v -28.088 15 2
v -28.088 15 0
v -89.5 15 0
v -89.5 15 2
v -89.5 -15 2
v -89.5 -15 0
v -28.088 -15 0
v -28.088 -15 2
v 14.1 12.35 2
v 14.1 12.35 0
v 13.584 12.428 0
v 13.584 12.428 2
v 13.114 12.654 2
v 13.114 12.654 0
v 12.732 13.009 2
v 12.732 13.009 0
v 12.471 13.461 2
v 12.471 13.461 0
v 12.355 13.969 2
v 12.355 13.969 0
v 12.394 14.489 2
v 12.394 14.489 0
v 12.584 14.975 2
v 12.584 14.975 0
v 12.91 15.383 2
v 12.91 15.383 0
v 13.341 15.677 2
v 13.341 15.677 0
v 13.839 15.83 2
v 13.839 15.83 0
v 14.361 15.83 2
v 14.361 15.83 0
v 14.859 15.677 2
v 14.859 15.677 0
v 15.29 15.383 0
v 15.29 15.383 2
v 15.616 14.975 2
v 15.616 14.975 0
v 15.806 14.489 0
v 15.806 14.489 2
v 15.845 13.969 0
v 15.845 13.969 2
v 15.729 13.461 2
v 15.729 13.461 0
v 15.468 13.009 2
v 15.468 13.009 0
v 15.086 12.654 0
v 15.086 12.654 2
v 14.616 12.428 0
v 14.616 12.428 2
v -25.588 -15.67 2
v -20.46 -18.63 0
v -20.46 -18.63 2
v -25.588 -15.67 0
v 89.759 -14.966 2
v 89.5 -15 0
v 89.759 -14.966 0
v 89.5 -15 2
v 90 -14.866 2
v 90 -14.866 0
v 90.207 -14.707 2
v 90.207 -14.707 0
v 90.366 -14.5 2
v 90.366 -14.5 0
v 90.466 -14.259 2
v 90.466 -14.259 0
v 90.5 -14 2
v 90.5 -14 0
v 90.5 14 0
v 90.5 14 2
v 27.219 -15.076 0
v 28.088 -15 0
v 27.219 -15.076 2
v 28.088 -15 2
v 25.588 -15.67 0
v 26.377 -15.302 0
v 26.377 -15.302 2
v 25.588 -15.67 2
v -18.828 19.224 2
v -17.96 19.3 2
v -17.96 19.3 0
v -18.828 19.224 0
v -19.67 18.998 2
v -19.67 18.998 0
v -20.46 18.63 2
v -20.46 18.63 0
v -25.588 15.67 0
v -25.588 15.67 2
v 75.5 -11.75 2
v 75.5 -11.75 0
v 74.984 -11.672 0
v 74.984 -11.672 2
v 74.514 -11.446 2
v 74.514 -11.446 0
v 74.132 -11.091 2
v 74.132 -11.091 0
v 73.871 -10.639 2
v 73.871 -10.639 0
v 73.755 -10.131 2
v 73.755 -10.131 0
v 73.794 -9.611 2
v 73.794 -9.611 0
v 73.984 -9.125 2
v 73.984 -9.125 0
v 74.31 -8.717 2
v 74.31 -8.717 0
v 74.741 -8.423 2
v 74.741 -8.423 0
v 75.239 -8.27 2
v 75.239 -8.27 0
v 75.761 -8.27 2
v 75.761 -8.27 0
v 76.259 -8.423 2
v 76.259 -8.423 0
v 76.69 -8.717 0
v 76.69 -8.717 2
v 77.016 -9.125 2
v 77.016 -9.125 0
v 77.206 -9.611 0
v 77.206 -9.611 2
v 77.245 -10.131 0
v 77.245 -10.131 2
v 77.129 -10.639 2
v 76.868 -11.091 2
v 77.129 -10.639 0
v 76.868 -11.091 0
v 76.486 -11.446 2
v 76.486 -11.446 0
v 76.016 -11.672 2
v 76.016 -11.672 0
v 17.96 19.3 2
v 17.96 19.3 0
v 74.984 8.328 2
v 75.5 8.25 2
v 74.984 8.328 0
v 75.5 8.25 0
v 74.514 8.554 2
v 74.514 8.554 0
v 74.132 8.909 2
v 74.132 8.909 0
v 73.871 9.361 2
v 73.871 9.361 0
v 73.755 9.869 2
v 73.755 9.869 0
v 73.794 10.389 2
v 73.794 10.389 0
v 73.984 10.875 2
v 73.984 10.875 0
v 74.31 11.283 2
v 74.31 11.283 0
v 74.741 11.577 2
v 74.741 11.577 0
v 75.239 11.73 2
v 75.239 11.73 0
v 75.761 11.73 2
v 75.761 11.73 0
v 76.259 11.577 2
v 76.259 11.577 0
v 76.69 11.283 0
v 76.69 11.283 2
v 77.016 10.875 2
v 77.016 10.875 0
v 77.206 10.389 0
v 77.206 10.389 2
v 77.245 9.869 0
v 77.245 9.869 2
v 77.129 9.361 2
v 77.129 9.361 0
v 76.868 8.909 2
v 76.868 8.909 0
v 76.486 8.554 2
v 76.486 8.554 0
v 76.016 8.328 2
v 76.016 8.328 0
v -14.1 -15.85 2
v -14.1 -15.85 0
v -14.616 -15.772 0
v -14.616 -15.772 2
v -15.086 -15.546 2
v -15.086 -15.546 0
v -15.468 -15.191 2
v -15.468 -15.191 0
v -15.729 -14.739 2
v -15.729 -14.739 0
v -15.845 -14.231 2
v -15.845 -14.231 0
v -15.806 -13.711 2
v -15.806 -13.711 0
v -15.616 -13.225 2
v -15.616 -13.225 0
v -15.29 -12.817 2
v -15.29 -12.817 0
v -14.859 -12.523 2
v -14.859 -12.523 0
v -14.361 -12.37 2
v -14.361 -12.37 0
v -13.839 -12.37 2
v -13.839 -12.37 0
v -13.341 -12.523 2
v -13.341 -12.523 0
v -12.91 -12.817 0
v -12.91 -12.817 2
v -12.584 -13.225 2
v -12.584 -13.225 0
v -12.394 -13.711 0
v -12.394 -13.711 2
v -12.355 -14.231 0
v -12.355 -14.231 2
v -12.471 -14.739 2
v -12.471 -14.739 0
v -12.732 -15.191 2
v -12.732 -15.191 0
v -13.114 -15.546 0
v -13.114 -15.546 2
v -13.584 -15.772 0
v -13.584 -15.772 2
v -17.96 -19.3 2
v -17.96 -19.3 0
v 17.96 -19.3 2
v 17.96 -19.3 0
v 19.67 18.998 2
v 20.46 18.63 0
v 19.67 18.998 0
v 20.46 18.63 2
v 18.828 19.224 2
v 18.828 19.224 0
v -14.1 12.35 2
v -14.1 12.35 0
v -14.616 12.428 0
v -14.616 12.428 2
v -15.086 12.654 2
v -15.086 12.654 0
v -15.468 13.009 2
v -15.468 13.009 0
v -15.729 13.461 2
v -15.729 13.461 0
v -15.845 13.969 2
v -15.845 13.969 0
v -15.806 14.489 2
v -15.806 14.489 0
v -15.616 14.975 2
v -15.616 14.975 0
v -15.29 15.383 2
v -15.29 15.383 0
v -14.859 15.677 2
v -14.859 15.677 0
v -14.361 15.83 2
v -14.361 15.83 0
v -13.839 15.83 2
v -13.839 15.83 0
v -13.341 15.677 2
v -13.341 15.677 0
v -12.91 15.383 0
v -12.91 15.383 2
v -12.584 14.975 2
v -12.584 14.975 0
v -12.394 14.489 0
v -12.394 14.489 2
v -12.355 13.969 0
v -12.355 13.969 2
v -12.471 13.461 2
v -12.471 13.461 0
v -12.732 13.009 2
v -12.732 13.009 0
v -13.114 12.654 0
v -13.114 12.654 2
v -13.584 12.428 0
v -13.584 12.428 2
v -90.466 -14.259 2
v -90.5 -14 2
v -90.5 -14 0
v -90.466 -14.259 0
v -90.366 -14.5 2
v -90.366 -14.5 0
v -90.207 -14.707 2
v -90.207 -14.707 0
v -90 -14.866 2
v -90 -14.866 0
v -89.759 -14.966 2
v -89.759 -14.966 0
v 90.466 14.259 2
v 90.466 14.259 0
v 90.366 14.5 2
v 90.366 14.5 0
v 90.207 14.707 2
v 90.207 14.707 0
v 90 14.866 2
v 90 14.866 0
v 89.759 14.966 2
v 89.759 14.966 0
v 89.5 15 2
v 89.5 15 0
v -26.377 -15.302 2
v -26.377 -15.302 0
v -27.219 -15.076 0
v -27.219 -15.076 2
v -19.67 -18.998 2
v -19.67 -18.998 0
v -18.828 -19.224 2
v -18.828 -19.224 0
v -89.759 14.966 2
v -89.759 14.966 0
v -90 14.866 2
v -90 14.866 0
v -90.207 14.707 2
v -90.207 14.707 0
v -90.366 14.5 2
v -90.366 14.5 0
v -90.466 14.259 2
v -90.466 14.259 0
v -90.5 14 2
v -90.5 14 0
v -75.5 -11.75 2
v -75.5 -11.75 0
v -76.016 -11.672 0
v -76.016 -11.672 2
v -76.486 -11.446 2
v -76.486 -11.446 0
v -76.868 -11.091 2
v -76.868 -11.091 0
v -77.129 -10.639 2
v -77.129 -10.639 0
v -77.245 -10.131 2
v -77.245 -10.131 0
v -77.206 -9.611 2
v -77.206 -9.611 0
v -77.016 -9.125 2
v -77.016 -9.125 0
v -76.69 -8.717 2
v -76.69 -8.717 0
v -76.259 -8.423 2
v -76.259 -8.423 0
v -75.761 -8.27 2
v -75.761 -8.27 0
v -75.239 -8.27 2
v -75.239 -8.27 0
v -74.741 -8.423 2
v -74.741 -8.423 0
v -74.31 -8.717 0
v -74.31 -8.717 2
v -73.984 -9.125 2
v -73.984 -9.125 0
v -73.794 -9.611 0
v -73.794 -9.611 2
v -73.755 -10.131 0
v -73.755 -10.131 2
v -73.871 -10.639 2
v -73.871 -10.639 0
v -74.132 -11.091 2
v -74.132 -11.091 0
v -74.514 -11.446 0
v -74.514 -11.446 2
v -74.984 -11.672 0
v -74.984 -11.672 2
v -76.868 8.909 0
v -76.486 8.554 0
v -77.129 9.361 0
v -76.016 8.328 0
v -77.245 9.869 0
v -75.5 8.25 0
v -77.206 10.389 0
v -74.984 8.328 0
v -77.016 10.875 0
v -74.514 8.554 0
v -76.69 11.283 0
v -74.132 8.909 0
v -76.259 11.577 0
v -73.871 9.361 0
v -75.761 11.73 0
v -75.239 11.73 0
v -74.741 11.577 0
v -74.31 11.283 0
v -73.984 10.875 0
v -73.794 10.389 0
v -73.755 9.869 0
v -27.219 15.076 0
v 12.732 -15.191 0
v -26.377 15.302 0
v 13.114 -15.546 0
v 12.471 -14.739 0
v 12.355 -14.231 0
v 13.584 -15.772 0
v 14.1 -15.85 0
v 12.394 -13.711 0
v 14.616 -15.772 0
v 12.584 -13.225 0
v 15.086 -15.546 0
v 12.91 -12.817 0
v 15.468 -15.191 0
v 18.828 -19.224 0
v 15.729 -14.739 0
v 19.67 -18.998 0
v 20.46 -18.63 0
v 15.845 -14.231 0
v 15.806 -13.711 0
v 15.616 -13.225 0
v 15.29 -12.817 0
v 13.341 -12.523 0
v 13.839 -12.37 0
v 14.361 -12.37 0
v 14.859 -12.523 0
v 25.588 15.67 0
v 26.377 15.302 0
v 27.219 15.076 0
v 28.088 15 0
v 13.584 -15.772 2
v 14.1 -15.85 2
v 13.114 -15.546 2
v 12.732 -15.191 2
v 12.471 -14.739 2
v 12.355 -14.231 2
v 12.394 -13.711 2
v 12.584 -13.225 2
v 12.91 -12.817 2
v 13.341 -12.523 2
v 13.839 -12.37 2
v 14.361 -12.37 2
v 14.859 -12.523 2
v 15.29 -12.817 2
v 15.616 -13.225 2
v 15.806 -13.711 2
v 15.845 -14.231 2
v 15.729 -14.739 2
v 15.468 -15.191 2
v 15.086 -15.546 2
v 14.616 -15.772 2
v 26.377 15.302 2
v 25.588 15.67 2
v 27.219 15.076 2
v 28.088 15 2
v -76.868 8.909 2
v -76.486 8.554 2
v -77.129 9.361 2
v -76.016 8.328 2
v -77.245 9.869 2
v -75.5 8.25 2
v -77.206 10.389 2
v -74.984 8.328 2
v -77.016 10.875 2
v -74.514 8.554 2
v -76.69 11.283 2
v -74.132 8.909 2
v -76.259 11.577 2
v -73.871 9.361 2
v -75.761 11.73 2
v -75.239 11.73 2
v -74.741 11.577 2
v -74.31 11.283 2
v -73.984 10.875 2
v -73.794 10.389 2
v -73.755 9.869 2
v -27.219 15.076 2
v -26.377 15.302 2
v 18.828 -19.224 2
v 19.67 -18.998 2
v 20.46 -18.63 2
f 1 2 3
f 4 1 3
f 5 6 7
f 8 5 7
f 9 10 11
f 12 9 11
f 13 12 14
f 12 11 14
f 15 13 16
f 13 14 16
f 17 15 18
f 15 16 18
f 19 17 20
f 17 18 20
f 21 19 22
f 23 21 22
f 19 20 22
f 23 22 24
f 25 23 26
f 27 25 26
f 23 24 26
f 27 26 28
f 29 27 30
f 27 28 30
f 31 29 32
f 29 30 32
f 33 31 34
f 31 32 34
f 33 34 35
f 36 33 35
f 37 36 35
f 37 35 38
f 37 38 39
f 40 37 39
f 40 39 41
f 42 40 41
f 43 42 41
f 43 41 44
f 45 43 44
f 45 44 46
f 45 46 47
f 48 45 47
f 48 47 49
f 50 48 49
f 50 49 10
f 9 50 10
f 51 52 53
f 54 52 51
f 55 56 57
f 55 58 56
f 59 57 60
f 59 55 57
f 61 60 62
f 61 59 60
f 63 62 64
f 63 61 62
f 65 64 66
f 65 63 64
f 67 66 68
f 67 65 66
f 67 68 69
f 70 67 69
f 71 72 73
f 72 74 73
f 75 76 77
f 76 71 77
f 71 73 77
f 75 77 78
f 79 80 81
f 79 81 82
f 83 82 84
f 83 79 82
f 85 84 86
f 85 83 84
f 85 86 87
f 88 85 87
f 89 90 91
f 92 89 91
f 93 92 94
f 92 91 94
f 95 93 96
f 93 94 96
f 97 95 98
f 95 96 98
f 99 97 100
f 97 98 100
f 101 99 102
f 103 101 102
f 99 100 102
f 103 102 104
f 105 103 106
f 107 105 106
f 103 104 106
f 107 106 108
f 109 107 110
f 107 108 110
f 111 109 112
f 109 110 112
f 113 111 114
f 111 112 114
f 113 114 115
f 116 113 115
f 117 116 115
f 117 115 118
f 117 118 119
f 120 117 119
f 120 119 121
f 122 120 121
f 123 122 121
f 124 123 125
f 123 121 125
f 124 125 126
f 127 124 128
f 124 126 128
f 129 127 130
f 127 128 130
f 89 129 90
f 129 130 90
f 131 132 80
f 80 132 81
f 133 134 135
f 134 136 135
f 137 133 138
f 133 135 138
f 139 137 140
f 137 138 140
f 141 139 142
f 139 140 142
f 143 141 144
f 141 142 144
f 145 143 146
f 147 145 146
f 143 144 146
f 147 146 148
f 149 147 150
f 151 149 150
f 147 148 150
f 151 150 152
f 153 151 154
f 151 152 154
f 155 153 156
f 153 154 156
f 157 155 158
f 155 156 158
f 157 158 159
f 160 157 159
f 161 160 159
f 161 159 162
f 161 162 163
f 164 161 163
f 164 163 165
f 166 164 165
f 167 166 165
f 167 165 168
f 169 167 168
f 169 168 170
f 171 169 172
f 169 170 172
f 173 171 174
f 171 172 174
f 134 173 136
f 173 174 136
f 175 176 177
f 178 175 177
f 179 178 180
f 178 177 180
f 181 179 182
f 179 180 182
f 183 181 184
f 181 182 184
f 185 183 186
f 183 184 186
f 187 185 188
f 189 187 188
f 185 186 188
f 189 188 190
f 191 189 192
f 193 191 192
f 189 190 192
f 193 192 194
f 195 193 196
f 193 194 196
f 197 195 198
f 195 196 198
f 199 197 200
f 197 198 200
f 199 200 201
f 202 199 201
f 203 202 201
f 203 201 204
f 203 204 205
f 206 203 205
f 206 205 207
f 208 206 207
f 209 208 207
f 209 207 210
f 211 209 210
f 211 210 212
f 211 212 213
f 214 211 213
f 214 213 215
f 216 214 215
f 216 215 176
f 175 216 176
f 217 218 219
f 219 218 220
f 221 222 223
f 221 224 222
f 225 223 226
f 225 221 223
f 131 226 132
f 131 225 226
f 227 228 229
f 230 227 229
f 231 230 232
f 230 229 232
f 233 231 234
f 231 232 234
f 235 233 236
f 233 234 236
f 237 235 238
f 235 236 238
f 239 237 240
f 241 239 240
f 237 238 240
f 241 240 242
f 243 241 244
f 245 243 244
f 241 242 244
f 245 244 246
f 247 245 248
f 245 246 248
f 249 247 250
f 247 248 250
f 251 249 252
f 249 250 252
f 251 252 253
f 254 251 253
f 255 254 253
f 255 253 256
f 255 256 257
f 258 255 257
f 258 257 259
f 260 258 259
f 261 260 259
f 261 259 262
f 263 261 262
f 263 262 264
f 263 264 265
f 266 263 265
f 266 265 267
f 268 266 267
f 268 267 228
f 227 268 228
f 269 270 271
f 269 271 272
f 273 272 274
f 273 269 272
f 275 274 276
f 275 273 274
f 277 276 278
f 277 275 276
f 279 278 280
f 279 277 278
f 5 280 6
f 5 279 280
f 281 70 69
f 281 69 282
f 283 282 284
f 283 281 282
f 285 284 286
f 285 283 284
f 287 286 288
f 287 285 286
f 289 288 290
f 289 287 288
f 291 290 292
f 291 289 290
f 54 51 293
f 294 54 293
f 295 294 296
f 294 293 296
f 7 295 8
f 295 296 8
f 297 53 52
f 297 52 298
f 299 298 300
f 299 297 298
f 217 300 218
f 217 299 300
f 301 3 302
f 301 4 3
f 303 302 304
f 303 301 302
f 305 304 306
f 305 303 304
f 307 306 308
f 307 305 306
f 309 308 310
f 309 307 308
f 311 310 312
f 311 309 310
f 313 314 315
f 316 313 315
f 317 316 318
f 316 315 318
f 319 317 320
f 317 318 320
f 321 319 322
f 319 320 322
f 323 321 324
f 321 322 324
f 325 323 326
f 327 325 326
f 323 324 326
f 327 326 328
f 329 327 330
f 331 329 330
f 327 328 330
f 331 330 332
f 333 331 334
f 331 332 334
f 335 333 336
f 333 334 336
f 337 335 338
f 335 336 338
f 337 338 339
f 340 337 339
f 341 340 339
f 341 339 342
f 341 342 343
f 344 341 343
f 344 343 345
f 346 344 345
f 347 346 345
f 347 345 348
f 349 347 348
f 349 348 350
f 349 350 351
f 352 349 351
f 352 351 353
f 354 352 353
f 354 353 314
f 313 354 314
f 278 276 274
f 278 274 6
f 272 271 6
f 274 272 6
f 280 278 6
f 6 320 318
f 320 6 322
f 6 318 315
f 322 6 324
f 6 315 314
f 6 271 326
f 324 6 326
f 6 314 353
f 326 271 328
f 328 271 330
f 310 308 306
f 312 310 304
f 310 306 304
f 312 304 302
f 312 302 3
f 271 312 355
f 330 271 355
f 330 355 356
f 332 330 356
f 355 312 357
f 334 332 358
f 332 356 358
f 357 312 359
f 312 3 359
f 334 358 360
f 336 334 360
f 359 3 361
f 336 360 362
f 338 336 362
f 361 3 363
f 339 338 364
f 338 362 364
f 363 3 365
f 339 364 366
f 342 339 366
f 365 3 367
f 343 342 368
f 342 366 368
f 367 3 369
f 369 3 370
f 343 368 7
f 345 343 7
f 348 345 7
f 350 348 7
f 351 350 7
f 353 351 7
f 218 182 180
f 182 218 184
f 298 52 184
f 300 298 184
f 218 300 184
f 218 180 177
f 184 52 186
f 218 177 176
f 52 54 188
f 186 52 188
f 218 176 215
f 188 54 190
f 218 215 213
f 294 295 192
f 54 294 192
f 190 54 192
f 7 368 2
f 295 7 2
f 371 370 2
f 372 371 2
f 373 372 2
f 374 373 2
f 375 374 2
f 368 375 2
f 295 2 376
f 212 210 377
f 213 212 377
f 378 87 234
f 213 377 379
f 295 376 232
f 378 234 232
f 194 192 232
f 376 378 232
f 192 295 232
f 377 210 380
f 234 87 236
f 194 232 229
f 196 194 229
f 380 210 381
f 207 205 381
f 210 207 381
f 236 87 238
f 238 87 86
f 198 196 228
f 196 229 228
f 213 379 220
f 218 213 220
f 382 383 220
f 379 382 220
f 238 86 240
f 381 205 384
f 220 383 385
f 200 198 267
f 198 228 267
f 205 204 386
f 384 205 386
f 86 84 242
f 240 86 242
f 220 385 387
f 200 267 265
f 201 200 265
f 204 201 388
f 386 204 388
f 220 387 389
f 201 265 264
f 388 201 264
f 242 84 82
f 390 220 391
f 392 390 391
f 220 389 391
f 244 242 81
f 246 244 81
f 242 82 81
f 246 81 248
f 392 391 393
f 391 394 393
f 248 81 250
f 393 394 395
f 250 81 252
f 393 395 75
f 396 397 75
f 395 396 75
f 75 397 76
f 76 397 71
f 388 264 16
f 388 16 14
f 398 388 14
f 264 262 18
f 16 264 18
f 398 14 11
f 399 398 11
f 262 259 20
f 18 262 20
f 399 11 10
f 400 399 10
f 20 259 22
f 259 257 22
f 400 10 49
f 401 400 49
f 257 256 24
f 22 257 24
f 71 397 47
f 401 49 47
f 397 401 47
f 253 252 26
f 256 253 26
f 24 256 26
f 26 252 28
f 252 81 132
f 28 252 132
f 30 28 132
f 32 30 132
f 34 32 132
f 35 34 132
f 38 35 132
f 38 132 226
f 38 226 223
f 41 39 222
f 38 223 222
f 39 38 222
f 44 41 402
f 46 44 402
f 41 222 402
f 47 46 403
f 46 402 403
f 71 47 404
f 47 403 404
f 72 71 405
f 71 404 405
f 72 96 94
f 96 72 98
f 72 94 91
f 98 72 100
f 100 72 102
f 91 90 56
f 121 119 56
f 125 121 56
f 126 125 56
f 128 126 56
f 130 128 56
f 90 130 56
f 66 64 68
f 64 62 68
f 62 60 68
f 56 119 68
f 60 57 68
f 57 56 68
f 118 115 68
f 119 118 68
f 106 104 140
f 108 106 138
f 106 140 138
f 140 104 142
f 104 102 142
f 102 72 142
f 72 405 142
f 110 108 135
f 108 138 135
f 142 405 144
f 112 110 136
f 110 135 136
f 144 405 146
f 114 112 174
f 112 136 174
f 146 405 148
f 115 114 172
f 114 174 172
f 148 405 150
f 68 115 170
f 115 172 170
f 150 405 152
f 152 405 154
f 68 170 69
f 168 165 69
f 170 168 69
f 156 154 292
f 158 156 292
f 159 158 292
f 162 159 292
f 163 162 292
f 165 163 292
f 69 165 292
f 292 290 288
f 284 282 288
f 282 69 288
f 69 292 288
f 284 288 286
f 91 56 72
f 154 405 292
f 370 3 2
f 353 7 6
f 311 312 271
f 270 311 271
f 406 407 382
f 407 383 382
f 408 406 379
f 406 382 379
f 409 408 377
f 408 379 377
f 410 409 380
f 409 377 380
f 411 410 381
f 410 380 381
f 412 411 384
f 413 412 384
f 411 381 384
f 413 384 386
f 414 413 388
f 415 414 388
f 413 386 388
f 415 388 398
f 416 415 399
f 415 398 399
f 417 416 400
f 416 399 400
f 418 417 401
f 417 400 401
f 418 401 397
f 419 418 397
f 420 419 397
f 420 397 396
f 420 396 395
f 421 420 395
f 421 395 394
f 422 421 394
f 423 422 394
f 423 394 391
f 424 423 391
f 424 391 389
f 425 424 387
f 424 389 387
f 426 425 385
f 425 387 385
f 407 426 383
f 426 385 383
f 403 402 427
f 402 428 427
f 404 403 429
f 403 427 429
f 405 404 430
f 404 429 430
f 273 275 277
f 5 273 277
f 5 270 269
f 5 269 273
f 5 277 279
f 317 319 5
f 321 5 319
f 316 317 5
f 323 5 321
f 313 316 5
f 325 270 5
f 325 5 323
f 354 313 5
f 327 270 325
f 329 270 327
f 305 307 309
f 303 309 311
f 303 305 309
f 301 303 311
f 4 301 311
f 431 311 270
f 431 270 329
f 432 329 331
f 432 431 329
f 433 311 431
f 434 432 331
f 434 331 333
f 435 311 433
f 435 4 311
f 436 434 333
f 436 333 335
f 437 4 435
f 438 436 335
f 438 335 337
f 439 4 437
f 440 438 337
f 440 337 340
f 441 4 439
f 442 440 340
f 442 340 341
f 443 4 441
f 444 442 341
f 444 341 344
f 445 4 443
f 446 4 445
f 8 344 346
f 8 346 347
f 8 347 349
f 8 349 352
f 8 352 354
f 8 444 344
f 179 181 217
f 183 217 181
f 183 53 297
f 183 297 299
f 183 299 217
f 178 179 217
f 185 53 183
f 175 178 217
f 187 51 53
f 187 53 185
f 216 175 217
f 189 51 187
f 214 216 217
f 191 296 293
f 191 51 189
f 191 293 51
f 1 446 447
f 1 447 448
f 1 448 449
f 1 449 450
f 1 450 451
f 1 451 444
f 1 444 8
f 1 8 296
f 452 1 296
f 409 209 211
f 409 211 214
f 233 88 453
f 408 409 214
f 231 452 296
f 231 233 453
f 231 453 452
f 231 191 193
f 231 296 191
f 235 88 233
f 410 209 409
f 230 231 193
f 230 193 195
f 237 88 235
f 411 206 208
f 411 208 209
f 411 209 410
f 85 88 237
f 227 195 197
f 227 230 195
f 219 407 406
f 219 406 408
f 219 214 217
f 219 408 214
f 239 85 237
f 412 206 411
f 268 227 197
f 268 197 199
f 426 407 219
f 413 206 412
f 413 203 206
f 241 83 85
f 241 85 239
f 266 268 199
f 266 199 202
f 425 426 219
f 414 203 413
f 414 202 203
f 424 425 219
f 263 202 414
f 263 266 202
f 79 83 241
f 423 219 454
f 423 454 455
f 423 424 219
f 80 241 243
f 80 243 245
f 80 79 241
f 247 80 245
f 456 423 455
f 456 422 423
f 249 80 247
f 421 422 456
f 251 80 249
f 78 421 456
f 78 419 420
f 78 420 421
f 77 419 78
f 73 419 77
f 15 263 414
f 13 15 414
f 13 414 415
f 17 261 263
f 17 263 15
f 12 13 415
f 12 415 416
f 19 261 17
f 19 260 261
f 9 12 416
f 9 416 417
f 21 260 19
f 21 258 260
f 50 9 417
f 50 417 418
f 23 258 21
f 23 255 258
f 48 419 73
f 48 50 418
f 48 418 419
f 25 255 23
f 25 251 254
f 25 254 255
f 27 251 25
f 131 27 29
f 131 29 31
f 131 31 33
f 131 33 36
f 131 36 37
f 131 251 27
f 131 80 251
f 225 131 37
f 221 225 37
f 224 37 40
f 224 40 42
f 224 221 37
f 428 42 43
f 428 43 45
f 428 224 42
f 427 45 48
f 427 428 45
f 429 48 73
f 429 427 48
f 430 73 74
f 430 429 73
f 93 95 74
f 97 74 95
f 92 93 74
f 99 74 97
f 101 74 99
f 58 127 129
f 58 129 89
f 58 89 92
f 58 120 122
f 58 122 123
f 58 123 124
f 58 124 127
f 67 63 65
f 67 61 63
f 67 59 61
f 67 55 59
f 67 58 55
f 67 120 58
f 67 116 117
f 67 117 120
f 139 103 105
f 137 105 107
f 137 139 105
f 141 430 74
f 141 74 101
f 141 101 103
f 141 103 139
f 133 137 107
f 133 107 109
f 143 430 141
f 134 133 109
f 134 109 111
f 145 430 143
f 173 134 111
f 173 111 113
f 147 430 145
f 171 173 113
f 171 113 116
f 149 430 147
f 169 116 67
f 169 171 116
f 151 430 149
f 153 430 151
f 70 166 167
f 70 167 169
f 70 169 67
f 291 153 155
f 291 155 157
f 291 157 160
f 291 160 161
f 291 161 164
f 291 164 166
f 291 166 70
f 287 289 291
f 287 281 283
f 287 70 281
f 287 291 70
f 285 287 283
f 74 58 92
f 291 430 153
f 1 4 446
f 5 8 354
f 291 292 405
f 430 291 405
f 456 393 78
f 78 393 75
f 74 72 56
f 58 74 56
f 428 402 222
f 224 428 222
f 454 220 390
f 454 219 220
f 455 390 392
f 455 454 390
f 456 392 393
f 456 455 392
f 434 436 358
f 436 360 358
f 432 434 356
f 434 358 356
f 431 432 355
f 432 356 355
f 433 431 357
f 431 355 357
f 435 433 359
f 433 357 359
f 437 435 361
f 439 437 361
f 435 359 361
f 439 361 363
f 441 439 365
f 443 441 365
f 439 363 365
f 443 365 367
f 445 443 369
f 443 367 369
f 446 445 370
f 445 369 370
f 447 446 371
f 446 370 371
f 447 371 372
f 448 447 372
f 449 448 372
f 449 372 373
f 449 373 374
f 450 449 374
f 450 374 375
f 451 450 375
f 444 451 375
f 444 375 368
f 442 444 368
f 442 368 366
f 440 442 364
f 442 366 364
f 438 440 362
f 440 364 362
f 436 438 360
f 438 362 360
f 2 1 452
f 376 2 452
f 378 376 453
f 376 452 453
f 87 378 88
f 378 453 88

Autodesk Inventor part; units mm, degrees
ref_plane "YZ Plane" through (0, 0, 0) normal (1, 0, 0) x (0, 1, 0)
ref_plane "XZ Plane" through (0, 0, 0) normal (0, 1, 0) x (-1, 0, 0)
ref_plane "XY Plane" through (0, 0, 0) normal (0, 0, 1) x (1, 0, 0)
sketch "スケッチ1" plane through (0, 0, 0) normal (0, 0, 1) x (1, 0, 0)
  line L0 (-90.5, -15) -> (90.5, -15)
  line L1 (90.5, -15) -> (90.5, 15)
  line L2 (90.5, 15) -> (-90.5, 15)
  line L3 (-90.5, 15) -> (-90.5, -15)
  line L4 (-90.5, -15) -> (90.5, 15) construction
  line L5 (90.5, -15) -> (-90.5, 15) construction
  line L6 (-19.3, -19.3) -> (19.3, -19.3)
  line L7 (19.3, -19.3) -> (19.3, 19.3)
  line L8 (19.3, 19.3) -> (-19.3, 19.3)
  line L9 (-19.3, 19.3) -> (-19.3, -19.3)
  line L10 (-19.3, -19.3) -> (19.3, 19.3) construction
  line L11 (19.3, -19.3) -> (-19.3, 19.3) construction
  line L12 (-19.3, 19.3) -> (-26.7478, 15)
  line L13 (-19.3, -19.3) -> (-26.7478, -15)
  line L14 (19.3, -19.3) -> (26.7478, -15)
  line L15 (26.7478, 15) -> (19.3, 19.3)
  point P0 (0, 0)
  dimension "d0" = 181
  dimension "d1" = 30
  dimension "d2" = 38.6
  dimension "d3" = 38.6
  dimension "d4" = 150
  dimension "d5" = 150
extrude "プレート1" add sketch "スケッチ1" along normal blind 2
sketch "スケッチ2" plane through (0, 0, 2) normal (0, 0, 1) x (1, 0, 0)
  line L0 (-75.5, -10) -> (75.5, -10) construction
  line L1 (75.5, -10) -> (75.5, 10) construction
  line L2 (75.5, 10) -> (-75.5, 10) construction
  line L3 (-75.5, 10) -> (-75.5, -10) construction
  line L4 (-75.5, -10) -> (75.5, 10) construction
  line L5 (75.5, -10) -> (-75.5, 10) construction
  point P0 (0, 0)
  dimension "d7" = 151
  dimension "d8" = 20
hole "穴1" at (-75.5, 10, 2) at (-75.5, -10, 2) at (75.5, -10, 2) at (75.5, 10, 2) direction (0, 0, -1) diameter 3.5 depth 2 tip angle 118
sketch "スケッチ3" plane through (0, 0, 2) normal (0, 0, 1) x (1, 0, 0)
  line L0 (-14.1, -14.1) -> (14.1, -14.1) construction
  line L1 (14.1, -14.1) -> (14.1, 14.1) construction
  line L2 (14.1, 14.1) -> (-14.1, 14.1) construction
  line L3 (-14.1, 14.1) -> (-14.1, -14.1) construction
  line L4 (-14.1, -14.1) -> (14.1, 14.1) construction
  line L5 (14.1, -14.1) -> (-14.1, 14.1) construction
  point P0 (0, 0)
  dimension "d16" = 28.2
  dimension "d17" = 28.2
hole "穴2" at (14.1, 14.1, 2) at (14.1, -14.1, 2) at (-14.1, -14.1, 2) at (-14.1, 14.1, 2) direction (0, 0, -1) diameter 3.5 depth 2 tip angle 118
fillet "フィレット1" radius 5 8 edges at (26.7478, 15, 1) (19.3, 19.3, 1) (26.7478, -15, 1) (19.3, -19.3, 1) (-19.3, -19.3, 1) (-26.7478, -15, 1) (-26.7478, 15, 1) (-19.3, 19.3, 1)
fillet "フィレット2" radius 1 4 edges at (-90.5, 15, 1) (-90.5, -15, 1) (90.5, -15, 1) (90.5, 15, 1)
equation "\"d3\" = d2"
equation "\"d5\" = d4"
equation "\"d14\" = Thickness"
equation "\"d23\" = Thickness"
equation "\"d6\" = Thickness"
equation "\"BendRadius\" = Thickness"
equation "\"BendReliefWidth\" = Thickness"
equation "\"BendReliefDepth\" = 0.5 * Thickness"
equation "\"CornerReliefSize\" = 4 * Thickness"
equation "\"MinimumRemnant\" = 2 * Thickness"
equation "\"TransitionRadius\" = BendRadius"
equation "\"JacobiRadiusSize\" = BendRadius"
equation "\"GapSize\" = Thickness"
equation "\"Thickness\" = 2"
properties part number "T2.0_frame-base4"
